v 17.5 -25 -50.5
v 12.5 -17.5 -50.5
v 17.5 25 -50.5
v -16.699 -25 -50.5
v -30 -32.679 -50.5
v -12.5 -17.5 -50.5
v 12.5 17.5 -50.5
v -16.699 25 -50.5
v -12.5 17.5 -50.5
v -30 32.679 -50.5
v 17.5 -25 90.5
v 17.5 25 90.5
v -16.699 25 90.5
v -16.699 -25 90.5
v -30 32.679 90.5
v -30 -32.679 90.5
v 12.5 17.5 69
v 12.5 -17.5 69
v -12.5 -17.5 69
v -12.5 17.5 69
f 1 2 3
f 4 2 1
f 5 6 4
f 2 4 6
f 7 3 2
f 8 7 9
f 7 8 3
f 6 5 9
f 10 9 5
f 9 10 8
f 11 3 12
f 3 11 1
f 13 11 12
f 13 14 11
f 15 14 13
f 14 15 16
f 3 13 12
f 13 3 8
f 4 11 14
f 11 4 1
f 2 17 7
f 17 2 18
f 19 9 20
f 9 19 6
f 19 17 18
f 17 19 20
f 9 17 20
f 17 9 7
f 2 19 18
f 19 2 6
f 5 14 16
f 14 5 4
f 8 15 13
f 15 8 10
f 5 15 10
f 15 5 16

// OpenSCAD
$fn = 6;
module 3sliposlide(){

    translate([0, 0, 20]){
        rotate([0, 90, 0]){
            difference(){
                cube([141, 50, 35], center = true);
                translate([11, 0, 0]){
                    #cube([120, 35, 25], center = true);
                }
            }
        }
    }
    translate([-60,0,20]){
        rotate([0, 180, 0]){
            slide(141);
        }
    }

}
module slide(height){
    rotate([0, 0, -30]){
        difference(){
            cylinder(height, d = 100, center= true);

                rotate([0,0, 30]){
                    translate([20, 0, 0]){
                        cube([100, 100, height+1], center = true);
                    }

                }

        }
    }
}

3sliposlide();
